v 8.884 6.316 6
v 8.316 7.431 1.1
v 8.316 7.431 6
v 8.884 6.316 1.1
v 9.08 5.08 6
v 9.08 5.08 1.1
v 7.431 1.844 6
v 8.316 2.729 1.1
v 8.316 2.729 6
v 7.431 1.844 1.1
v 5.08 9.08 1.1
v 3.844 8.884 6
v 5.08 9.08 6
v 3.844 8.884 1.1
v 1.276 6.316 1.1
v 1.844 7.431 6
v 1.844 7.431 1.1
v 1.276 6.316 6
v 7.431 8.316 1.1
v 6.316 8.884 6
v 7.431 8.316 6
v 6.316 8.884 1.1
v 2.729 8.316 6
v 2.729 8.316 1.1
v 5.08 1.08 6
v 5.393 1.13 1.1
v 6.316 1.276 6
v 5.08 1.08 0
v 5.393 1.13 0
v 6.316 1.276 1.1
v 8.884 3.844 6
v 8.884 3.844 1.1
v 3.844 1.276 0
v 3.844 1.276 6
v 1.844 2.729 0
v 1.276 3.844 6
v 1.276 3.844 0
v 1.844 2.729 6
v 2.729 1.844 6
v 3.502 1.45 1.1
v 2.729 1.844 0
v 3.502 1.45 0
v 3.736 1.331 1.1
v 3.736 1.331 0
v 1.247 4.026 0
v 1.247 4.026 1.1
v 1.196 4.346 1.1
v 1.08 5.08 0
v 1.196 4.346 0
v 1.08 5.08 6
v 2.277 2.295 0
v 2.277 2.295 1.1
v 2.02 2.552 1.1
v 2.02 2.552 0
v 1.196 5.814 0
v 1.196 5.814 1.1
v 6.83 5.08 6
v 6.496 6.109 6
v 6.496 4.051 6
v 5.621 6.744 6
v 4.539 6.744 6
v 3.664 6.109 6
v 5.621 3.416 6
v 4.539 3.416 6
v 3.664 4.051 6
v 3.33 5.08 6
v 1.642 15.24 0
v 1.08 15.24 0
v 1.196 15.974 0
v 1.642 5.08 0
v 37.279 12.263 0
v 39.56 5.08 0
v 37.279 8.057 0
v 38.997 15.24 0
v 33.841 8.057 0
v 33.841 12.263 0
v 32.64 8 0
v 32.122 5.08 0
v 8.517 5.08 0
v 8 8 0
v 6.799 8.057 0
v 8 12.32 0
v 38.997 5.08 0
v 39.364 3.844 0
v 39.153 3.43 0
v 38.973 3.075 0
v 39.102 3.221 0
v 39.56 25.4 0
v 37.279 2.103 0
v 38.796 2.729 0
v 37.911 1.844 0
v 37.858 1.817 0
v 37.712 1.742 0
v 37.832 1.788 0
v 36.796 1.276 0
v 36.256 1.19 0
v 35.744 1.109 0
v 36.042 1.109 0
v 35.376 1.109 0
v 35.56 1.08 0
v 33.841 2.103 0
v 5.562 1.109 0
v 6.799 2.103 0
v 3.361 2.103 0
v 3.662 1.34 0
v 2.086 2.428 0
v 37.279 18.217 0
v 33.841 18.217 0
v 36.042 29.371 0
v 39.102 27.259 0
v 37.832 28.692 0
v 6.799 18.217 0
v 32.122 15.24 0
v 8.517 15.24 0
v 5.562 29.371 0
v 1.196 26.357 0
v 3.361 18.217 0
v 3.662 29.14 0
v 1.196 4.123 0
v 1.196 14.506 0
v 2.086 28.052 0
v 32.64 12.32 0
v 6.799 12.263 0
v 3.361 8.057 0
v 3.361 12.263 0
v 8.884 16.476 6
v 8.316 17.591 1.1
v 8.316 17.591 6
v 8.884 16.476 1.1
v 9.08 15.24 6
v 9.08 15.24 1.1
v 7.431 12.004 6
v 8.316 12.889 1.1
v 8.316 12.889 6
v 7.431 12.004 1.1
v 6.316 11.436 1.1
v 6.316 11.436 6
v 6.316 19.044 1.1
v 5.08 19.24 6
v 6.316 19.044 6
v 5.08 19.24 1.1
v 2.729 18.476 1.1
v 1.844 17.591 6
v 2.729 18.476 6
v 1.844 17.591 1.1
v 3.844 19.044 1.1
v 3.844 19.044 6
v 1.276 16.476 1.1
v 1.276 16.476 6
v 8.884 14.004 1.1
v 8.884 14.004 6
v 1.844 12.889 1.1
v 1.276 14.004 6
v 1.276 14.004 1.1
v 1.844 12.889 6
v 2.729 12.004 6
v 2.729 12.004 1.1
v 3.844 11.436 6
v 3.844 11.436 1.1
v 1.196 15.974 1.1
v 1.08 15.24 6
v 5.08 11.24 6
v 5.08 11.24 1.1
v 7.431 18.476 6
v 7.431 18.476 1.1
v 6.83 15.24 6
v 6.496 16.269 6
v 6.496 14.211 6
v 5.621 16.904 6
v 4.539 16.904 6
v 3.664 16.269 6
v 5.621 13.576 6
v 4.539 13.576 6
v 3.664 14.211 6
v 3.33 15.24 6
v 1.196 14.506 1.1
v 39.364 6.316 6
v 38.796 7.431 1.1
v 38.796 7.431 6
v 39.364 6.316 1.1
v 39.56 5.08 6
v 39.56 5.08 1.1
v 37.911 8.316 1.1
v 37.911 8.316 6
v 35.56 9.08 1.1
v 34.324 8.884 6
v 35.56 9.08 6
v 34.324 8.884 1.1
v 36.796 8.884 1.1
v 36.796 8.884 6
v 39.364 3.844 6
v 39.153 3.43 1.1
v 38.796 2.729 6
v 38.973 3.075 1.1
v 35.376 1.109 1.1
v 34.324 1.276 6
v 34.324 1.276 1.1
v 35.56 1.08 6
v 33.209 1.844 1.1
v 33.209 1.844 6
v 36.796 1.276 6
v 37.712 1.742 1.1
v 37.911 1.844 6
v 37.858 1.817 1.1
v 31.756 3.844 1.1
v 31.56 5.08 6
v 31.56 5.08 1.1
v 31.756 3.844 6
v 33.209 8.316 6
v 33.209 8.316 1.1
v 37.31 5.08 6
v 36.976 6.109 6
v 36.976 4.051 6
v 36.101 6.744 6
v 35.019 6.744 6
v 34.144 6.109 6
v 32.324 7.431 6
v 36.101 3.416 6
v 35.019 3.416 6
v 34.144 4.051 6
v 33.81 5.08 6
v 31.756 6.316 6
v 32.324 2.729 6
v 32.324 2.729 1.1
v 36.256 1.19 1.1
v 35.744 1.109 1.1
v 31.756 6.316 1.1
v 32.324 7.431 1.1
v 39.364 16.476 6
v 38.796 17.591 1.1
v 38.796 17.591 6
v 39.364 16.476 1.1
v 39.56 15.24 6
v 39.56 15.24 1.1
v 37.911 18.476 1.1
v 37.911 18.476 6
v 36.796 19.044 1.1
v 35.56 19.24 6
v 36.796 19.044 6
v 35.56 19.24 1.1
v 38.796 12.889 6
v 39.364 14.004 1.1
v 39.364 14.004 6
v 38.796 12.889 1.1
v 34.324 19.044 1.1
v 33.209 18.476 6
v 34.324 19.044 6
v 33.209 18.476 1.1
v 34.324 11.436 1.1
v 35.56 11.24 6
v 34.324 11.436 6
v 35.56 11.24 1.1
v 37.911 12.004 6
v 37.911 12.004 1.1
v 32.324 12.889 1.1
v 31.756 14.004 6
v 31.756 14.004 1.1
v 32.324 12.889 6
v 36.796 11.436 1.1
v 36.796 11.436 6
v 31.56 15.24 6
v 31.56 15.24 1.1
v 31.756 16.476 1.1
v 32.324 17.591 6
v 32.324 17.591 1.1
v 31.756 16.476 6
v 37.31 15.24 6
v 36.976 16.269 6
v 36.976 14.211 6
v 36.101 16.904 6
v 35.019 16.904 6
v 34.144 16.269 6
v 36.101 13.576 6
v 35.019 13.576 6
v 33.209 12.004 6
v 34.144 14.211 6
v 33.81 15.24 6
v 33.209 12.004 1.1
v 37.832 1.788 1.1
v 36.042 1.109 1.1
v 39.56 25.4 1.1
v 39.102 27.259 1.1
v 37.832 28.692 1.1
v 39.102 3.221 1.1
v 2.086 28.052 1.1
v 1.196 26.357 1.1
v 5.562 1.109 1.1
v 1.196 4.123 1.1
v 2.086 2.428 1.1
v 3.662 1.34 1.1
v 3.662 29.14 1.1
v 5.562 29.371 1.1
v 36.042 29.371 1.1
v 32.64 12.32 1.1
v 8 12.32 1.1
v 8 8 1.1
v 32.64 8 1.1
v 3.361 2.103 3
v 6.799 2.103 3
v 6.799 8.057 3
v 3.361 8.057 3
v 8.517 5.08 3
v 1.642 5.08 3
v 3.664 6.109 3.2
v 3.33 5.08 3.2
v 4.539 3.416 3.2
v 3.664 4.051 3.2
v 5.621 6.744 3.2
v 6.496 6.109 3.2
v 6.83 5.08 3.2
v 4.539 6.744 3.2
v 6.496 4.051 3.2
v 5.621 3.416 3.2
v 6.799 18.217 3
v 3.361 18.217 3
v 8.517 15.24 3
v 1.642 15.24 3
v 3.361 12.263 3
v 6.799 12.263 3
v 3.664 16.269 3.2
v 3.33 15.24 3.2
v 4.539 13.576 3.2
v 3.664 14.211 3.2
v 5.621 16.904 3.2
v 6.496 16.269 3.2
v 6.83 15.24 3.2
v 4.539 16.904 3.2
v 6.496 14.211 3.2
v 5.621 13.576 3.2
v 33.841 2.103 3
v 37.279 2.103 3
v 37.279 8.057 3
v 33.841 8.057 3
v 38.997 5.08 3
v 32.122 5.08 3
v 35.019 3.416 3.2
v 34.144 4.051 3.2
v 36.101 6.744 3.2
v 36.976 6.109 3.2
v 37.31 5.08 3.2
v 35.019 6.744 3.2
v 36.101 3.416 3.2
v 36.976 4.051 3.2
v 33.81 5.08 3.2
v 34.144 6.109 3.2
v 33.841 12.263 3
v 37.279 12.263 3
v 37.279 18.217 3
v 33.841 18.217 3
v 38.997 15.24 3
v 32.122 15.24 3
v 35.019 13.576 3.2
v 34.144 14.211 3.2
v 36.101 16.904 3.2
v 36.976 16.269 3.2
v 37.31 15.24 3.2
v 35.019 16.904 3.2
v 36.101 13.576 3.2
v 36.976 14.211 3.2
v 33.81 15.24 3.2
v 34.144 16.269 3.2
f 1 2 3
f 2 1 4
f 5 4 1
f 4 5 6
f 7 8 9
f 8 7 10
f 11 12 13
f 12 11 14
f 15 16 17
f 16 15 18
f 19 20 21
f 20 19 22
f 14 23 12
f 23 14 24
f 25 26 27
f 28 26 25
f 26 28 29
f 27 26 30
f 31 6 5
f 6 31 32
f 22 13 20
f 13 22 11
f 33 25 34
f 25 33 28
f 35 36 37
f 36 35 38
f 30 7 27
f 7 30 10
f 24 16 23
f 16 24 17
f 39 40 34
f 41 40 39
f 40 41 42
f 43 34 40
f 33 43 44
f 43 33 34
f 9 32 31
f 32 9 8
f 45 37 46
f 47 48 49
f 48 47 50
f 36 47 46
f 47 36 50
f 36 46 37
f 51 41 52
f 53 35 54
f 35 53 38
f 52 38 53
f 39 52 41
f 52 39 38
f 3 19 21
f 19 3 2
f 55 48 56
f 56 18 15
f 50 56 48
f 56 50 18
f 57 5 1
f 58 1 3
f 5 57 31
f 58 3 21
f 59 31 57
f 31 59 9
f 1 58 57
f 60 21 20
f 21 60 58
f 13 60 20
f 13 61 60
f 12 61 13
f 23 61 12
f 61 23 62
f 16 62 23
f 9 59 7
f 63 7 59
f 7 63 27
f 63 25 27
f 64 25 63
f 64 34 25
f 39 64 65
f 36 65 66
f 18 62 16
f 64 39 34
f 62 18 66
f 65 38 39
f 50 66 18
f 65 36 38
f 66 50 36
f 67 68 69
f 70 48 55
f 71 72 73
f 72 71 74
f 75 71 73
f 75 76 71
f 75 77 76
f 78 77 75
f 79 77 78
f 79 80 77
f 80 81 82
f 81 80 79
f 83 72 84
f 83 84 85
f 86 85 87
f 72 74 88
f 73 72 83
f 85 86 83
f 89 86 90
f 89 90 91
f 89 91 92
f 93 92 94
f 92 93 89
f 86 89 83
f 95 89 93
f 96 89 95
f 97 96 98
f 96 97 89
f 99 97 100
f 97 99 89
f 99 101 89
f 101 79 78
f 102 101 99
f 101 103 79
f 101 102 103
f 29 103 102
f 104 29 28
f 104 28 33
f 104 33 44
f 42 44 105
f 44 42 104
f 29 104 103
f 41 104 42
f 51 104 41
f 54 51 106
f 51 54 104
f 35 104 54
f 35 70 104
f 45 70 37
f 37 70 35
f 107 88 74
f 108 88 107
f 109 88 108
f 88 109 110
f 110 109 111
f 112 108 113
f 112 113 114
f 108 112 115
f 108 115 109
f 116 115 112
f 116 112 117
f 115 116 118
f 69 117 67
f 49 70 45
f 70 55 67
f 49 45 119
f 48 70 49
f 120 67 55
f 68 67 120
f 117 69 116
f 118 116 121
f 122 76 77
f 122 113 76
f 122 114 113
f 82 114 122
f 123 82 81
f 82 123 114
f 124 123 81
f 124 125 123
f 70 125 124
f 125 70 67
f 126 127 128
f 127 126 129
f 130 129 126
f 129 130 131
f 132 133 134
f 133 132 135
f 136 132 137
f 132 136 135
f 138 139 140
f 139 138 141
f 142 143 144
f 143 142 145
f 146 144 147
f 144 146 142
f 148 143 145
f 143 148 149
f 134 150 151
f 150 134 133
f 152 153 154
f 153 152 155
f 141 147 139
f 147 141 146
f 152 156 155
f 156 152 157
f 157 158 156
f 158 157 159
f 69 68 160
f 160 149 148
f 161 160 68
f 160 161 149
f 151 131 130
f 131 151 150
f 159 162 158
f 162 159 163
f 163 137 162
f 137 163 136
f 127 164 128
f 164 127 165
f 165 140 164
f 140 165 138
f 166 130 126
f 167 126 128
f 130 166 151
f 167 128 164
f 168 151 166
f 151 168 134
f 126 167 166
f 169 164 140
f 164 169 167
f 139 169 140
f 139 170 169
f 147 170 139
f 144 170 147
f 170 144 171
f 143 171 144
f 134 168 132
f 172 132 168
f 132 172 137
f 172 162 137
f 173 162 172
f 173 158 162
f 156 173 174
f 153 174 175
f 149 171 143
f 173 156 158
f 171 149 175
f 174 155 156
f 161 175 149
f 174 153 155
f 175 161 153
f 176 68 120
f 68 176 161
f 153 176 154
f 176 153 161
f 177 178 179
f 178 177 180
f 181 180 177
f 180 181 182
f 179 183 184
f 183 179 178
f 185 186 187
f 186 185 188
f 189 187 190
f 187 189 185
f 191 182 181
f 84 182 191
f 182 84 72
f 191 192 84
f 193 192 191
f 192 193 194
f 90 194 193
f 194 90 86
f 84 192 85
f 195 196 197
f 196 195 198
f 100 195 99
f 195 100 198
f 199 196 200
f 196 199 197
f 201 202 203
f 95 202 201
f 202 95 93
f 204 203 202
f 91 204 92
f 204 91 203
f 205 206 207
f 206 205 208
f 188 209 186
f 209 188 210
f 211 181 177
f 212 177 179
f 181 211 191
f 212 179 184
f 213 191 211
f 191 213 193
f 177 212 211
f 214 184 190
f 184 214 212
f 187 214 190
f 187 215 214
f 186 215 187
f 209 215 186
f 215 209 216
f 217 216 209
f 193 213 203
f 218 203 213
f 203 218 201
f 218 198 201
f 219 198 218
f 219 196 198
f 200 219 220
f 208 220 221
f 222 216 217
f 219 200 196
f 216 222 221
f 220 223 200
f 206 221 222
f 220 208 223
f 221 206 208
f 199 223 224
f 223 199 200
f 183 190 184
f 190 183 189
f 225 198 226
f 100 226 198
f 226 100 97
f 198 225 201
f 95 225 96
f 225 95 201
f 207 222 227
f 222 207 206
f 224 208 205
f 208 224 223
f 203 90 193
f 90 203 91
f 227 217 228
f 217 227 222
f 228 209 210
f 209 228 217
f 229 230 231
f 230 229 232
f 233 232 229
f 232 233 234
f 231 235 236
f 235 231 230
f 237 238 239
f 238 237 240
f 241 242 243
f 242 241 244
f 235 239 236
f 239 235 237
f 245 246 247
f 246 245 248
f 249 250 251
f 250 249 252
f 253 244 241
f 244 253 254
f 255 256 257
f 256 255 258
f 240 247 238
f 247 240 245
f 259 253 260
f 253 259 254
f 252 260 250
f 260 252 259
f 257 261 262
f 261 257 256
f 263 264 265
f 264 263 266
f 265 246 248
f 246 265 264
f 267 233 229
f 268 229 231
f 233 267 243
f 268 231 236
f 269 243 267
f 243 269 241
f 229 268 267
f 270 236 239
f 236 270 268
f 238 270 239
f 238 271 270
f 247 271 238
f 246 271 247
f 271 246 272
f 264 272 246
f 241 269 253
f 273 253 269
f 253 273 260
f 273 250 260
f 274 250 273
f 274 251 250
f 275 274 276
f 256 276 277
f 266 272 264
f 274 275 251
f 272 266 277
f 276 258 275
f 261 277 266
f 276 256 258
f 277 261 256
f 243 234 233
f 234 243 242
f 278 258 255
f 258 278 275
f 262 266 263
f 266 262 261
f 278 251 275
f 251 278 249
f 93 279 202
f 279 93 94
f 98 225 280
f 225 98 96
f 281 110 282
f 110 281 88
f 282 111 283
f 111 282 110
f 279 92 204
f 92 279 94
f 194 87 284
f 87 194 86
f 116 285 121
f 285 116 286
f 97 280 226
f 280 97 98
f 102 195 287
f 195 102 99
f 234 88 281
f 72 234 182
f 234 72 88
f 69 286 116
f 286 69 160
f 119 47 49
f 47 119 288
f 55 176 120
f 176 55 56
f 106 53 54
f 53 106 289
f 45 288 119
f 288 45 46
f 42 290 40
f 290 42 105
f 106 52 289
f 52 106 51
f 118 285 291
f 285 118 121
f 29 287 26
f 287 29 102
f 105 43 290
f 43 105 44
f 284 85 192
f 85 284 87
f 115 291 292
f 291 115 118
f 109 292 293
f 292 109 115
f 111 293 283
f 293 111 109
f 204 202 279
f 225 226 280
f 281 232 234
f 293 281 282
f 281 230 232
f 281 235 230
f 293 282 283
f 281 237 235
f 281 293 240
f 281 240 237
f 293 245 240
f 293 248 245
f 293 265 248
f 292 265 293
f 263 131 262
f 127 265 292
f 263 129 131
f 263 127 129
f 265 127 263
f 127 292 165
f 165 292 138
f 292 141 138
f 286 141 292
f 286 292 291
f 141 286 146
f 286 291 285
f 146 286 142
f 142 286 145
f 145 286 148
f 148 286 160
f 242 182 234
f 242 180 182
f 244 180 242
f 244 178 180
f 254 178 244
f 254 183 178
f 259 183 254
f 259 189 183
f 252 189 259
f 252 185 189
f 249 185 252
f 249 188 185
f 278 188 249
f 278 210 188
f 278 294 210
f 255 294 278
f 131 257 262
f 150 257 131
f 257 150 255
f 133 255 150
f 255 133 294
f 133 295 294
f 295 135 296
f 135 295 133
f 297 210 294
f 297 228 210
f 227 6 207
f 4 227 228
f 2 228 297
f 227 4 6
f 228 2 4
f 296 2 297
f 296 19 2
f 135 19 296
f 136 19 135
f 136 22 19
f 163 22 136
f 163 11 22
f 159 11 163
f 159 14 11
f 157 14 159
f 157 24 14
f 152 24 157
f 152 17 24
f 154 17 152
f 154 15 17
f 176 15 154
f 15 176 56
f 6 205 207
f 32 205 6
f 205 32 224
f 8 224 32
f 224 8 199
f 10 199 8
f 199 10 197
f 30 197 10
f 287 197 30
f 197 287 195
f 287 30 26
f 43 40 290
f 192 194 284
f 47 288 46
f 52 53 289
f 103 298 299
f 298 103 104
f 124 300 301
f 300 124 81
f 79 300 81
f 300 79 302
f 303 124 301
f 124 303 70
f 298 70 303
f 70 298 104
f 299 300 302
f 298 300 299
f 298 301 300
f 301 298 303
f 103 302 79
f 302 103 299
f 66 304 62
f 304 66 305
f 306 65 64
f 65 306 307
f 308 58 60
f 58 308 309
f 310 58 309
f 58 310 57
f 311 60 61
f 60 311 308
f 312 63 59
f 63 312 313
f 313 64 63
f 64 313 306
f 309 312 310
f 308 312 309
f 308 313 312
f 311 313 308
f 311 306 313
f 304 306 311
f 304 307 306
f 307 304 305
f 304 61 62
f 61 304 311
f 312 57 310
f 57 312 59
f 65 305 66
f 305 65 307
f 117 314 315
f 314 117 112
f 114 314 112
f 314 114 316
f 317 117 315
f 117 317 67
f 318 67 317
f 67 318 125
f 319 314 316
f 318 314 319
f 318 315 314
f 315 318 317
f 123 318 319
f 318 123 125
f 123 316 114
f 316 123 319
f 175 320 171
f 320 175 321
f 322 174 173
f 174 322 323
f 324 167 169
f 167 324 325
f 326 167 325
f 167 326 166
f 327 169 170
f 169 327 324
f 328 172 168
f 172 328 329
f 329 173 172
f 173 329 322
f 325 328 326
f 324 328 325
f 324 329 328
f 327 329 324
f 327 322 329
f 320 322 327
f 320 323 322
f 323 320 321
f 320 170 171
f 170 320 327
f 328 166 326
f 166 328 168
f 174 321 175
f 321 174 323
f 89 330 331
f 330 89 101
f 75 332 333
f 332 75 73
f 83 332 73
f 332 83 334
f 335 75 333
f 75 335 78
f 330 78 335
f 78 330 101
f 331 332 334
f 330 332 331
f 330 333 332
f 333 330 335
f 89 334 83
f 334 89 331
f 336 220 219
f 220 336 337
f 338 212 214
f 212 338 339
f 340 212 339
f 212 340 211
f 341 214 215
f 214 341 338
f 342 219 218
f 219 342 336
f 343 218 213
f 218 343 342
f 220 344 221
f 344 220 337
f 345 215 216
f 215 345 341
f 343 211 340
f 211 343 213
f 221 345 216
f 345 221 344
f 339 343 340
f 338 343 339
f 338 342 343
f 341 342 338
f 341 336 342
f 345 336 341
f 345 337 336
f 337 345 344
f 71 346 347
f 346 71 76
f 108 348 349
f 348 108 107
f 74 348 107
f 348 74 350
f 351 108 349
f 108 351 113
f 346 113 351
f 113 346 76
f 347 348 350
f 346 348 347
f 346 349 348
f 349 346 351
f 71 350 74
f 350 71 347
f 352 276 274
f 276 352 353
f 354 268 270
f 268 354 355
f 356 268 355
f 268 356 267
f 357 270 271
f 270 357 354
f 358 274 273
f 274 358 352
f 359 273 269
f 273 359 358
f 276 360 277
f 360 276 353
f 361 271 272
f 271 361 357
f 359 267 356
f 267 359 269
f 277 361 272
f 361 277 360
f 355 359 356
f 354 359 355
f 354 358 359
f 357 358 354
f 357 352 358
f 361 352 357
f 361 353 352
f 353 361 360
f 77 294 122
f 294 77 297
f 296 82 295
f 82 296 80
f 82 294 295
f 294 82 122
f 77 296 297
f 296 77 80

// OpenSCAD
x_holes = 4;
y_holes = 3;
MLAB_grid = 10.16;
pile_radius = 4;
pedestal_height = 6;   // designed for use the MLAB standard 20mm screws.
x_size = x_holes * MLAB_grid ;
y_size = (y_holes-1) * MLAB_grid ;
mount_hole = 3.5;
//nut_size = 6.8;  //size suitable for PLA material
nut_size = 6.7;  //size suitable for ABS material
clear = 0.175;


thickness = 1;

MLAB_grid_xoffset = MLAB_grid/2;
MLAB_grid_yoffset = MLAB_grid/2;

grid_list = [for (j = [MLAB_grid_xoffset : MLAB_grid: x_size], i = [MLAB_grid_yoffset :MLAB_grid: y_size]) 
if ((j>(x_size-10) && i>(y_size-10)) || (j<10 && i<10) || (j<10 && i>(y_size-10)) || (j>(x_size-10) && i<10) ) [j, i] ];


difference () {
    union () {
        for (j = grid_list) {
            translate (concat(j, [0]))
            cylinder (h = pedestal_height, r= pile_radius, $fn=20);
        }

y_size = (y_holes) * MLAB_grid ;
            translate ([MLAB_grid_xoffset , MLAB_grid_yoffset , 0])
                minkowski() {
                cube([x_size - 2*(MLAB_grid/2 - pile_radius) - 2*pile_radius, y_size - 2*(MLAB_grid/2 - pile_radius) - 2*pile_radius, thickness]);          // base plastics brick
                cylinder(r=pile_radius,h=0.1);
            }
    }
    
    translate ([2*pile_radius, 2*pile_radius, 0]) // central hole in module support
        cube([x_size-4*pile_radius, y_size-4*pile_radius, 2*thickness]);          

    // MLAB grid holes
    for (j = grid_list) {
            translate (concat(j, [0]))
            cylinder (h = 3, r= (nut_size+clear)/2, $fn=6);
            translate (concat(j, [3.2]))  // one solid layer for slicer (the holes will be pierced on demand )
            cylinder (h = pedestal_height, r= mount_hole/2, $fn=10);
        }    
}
